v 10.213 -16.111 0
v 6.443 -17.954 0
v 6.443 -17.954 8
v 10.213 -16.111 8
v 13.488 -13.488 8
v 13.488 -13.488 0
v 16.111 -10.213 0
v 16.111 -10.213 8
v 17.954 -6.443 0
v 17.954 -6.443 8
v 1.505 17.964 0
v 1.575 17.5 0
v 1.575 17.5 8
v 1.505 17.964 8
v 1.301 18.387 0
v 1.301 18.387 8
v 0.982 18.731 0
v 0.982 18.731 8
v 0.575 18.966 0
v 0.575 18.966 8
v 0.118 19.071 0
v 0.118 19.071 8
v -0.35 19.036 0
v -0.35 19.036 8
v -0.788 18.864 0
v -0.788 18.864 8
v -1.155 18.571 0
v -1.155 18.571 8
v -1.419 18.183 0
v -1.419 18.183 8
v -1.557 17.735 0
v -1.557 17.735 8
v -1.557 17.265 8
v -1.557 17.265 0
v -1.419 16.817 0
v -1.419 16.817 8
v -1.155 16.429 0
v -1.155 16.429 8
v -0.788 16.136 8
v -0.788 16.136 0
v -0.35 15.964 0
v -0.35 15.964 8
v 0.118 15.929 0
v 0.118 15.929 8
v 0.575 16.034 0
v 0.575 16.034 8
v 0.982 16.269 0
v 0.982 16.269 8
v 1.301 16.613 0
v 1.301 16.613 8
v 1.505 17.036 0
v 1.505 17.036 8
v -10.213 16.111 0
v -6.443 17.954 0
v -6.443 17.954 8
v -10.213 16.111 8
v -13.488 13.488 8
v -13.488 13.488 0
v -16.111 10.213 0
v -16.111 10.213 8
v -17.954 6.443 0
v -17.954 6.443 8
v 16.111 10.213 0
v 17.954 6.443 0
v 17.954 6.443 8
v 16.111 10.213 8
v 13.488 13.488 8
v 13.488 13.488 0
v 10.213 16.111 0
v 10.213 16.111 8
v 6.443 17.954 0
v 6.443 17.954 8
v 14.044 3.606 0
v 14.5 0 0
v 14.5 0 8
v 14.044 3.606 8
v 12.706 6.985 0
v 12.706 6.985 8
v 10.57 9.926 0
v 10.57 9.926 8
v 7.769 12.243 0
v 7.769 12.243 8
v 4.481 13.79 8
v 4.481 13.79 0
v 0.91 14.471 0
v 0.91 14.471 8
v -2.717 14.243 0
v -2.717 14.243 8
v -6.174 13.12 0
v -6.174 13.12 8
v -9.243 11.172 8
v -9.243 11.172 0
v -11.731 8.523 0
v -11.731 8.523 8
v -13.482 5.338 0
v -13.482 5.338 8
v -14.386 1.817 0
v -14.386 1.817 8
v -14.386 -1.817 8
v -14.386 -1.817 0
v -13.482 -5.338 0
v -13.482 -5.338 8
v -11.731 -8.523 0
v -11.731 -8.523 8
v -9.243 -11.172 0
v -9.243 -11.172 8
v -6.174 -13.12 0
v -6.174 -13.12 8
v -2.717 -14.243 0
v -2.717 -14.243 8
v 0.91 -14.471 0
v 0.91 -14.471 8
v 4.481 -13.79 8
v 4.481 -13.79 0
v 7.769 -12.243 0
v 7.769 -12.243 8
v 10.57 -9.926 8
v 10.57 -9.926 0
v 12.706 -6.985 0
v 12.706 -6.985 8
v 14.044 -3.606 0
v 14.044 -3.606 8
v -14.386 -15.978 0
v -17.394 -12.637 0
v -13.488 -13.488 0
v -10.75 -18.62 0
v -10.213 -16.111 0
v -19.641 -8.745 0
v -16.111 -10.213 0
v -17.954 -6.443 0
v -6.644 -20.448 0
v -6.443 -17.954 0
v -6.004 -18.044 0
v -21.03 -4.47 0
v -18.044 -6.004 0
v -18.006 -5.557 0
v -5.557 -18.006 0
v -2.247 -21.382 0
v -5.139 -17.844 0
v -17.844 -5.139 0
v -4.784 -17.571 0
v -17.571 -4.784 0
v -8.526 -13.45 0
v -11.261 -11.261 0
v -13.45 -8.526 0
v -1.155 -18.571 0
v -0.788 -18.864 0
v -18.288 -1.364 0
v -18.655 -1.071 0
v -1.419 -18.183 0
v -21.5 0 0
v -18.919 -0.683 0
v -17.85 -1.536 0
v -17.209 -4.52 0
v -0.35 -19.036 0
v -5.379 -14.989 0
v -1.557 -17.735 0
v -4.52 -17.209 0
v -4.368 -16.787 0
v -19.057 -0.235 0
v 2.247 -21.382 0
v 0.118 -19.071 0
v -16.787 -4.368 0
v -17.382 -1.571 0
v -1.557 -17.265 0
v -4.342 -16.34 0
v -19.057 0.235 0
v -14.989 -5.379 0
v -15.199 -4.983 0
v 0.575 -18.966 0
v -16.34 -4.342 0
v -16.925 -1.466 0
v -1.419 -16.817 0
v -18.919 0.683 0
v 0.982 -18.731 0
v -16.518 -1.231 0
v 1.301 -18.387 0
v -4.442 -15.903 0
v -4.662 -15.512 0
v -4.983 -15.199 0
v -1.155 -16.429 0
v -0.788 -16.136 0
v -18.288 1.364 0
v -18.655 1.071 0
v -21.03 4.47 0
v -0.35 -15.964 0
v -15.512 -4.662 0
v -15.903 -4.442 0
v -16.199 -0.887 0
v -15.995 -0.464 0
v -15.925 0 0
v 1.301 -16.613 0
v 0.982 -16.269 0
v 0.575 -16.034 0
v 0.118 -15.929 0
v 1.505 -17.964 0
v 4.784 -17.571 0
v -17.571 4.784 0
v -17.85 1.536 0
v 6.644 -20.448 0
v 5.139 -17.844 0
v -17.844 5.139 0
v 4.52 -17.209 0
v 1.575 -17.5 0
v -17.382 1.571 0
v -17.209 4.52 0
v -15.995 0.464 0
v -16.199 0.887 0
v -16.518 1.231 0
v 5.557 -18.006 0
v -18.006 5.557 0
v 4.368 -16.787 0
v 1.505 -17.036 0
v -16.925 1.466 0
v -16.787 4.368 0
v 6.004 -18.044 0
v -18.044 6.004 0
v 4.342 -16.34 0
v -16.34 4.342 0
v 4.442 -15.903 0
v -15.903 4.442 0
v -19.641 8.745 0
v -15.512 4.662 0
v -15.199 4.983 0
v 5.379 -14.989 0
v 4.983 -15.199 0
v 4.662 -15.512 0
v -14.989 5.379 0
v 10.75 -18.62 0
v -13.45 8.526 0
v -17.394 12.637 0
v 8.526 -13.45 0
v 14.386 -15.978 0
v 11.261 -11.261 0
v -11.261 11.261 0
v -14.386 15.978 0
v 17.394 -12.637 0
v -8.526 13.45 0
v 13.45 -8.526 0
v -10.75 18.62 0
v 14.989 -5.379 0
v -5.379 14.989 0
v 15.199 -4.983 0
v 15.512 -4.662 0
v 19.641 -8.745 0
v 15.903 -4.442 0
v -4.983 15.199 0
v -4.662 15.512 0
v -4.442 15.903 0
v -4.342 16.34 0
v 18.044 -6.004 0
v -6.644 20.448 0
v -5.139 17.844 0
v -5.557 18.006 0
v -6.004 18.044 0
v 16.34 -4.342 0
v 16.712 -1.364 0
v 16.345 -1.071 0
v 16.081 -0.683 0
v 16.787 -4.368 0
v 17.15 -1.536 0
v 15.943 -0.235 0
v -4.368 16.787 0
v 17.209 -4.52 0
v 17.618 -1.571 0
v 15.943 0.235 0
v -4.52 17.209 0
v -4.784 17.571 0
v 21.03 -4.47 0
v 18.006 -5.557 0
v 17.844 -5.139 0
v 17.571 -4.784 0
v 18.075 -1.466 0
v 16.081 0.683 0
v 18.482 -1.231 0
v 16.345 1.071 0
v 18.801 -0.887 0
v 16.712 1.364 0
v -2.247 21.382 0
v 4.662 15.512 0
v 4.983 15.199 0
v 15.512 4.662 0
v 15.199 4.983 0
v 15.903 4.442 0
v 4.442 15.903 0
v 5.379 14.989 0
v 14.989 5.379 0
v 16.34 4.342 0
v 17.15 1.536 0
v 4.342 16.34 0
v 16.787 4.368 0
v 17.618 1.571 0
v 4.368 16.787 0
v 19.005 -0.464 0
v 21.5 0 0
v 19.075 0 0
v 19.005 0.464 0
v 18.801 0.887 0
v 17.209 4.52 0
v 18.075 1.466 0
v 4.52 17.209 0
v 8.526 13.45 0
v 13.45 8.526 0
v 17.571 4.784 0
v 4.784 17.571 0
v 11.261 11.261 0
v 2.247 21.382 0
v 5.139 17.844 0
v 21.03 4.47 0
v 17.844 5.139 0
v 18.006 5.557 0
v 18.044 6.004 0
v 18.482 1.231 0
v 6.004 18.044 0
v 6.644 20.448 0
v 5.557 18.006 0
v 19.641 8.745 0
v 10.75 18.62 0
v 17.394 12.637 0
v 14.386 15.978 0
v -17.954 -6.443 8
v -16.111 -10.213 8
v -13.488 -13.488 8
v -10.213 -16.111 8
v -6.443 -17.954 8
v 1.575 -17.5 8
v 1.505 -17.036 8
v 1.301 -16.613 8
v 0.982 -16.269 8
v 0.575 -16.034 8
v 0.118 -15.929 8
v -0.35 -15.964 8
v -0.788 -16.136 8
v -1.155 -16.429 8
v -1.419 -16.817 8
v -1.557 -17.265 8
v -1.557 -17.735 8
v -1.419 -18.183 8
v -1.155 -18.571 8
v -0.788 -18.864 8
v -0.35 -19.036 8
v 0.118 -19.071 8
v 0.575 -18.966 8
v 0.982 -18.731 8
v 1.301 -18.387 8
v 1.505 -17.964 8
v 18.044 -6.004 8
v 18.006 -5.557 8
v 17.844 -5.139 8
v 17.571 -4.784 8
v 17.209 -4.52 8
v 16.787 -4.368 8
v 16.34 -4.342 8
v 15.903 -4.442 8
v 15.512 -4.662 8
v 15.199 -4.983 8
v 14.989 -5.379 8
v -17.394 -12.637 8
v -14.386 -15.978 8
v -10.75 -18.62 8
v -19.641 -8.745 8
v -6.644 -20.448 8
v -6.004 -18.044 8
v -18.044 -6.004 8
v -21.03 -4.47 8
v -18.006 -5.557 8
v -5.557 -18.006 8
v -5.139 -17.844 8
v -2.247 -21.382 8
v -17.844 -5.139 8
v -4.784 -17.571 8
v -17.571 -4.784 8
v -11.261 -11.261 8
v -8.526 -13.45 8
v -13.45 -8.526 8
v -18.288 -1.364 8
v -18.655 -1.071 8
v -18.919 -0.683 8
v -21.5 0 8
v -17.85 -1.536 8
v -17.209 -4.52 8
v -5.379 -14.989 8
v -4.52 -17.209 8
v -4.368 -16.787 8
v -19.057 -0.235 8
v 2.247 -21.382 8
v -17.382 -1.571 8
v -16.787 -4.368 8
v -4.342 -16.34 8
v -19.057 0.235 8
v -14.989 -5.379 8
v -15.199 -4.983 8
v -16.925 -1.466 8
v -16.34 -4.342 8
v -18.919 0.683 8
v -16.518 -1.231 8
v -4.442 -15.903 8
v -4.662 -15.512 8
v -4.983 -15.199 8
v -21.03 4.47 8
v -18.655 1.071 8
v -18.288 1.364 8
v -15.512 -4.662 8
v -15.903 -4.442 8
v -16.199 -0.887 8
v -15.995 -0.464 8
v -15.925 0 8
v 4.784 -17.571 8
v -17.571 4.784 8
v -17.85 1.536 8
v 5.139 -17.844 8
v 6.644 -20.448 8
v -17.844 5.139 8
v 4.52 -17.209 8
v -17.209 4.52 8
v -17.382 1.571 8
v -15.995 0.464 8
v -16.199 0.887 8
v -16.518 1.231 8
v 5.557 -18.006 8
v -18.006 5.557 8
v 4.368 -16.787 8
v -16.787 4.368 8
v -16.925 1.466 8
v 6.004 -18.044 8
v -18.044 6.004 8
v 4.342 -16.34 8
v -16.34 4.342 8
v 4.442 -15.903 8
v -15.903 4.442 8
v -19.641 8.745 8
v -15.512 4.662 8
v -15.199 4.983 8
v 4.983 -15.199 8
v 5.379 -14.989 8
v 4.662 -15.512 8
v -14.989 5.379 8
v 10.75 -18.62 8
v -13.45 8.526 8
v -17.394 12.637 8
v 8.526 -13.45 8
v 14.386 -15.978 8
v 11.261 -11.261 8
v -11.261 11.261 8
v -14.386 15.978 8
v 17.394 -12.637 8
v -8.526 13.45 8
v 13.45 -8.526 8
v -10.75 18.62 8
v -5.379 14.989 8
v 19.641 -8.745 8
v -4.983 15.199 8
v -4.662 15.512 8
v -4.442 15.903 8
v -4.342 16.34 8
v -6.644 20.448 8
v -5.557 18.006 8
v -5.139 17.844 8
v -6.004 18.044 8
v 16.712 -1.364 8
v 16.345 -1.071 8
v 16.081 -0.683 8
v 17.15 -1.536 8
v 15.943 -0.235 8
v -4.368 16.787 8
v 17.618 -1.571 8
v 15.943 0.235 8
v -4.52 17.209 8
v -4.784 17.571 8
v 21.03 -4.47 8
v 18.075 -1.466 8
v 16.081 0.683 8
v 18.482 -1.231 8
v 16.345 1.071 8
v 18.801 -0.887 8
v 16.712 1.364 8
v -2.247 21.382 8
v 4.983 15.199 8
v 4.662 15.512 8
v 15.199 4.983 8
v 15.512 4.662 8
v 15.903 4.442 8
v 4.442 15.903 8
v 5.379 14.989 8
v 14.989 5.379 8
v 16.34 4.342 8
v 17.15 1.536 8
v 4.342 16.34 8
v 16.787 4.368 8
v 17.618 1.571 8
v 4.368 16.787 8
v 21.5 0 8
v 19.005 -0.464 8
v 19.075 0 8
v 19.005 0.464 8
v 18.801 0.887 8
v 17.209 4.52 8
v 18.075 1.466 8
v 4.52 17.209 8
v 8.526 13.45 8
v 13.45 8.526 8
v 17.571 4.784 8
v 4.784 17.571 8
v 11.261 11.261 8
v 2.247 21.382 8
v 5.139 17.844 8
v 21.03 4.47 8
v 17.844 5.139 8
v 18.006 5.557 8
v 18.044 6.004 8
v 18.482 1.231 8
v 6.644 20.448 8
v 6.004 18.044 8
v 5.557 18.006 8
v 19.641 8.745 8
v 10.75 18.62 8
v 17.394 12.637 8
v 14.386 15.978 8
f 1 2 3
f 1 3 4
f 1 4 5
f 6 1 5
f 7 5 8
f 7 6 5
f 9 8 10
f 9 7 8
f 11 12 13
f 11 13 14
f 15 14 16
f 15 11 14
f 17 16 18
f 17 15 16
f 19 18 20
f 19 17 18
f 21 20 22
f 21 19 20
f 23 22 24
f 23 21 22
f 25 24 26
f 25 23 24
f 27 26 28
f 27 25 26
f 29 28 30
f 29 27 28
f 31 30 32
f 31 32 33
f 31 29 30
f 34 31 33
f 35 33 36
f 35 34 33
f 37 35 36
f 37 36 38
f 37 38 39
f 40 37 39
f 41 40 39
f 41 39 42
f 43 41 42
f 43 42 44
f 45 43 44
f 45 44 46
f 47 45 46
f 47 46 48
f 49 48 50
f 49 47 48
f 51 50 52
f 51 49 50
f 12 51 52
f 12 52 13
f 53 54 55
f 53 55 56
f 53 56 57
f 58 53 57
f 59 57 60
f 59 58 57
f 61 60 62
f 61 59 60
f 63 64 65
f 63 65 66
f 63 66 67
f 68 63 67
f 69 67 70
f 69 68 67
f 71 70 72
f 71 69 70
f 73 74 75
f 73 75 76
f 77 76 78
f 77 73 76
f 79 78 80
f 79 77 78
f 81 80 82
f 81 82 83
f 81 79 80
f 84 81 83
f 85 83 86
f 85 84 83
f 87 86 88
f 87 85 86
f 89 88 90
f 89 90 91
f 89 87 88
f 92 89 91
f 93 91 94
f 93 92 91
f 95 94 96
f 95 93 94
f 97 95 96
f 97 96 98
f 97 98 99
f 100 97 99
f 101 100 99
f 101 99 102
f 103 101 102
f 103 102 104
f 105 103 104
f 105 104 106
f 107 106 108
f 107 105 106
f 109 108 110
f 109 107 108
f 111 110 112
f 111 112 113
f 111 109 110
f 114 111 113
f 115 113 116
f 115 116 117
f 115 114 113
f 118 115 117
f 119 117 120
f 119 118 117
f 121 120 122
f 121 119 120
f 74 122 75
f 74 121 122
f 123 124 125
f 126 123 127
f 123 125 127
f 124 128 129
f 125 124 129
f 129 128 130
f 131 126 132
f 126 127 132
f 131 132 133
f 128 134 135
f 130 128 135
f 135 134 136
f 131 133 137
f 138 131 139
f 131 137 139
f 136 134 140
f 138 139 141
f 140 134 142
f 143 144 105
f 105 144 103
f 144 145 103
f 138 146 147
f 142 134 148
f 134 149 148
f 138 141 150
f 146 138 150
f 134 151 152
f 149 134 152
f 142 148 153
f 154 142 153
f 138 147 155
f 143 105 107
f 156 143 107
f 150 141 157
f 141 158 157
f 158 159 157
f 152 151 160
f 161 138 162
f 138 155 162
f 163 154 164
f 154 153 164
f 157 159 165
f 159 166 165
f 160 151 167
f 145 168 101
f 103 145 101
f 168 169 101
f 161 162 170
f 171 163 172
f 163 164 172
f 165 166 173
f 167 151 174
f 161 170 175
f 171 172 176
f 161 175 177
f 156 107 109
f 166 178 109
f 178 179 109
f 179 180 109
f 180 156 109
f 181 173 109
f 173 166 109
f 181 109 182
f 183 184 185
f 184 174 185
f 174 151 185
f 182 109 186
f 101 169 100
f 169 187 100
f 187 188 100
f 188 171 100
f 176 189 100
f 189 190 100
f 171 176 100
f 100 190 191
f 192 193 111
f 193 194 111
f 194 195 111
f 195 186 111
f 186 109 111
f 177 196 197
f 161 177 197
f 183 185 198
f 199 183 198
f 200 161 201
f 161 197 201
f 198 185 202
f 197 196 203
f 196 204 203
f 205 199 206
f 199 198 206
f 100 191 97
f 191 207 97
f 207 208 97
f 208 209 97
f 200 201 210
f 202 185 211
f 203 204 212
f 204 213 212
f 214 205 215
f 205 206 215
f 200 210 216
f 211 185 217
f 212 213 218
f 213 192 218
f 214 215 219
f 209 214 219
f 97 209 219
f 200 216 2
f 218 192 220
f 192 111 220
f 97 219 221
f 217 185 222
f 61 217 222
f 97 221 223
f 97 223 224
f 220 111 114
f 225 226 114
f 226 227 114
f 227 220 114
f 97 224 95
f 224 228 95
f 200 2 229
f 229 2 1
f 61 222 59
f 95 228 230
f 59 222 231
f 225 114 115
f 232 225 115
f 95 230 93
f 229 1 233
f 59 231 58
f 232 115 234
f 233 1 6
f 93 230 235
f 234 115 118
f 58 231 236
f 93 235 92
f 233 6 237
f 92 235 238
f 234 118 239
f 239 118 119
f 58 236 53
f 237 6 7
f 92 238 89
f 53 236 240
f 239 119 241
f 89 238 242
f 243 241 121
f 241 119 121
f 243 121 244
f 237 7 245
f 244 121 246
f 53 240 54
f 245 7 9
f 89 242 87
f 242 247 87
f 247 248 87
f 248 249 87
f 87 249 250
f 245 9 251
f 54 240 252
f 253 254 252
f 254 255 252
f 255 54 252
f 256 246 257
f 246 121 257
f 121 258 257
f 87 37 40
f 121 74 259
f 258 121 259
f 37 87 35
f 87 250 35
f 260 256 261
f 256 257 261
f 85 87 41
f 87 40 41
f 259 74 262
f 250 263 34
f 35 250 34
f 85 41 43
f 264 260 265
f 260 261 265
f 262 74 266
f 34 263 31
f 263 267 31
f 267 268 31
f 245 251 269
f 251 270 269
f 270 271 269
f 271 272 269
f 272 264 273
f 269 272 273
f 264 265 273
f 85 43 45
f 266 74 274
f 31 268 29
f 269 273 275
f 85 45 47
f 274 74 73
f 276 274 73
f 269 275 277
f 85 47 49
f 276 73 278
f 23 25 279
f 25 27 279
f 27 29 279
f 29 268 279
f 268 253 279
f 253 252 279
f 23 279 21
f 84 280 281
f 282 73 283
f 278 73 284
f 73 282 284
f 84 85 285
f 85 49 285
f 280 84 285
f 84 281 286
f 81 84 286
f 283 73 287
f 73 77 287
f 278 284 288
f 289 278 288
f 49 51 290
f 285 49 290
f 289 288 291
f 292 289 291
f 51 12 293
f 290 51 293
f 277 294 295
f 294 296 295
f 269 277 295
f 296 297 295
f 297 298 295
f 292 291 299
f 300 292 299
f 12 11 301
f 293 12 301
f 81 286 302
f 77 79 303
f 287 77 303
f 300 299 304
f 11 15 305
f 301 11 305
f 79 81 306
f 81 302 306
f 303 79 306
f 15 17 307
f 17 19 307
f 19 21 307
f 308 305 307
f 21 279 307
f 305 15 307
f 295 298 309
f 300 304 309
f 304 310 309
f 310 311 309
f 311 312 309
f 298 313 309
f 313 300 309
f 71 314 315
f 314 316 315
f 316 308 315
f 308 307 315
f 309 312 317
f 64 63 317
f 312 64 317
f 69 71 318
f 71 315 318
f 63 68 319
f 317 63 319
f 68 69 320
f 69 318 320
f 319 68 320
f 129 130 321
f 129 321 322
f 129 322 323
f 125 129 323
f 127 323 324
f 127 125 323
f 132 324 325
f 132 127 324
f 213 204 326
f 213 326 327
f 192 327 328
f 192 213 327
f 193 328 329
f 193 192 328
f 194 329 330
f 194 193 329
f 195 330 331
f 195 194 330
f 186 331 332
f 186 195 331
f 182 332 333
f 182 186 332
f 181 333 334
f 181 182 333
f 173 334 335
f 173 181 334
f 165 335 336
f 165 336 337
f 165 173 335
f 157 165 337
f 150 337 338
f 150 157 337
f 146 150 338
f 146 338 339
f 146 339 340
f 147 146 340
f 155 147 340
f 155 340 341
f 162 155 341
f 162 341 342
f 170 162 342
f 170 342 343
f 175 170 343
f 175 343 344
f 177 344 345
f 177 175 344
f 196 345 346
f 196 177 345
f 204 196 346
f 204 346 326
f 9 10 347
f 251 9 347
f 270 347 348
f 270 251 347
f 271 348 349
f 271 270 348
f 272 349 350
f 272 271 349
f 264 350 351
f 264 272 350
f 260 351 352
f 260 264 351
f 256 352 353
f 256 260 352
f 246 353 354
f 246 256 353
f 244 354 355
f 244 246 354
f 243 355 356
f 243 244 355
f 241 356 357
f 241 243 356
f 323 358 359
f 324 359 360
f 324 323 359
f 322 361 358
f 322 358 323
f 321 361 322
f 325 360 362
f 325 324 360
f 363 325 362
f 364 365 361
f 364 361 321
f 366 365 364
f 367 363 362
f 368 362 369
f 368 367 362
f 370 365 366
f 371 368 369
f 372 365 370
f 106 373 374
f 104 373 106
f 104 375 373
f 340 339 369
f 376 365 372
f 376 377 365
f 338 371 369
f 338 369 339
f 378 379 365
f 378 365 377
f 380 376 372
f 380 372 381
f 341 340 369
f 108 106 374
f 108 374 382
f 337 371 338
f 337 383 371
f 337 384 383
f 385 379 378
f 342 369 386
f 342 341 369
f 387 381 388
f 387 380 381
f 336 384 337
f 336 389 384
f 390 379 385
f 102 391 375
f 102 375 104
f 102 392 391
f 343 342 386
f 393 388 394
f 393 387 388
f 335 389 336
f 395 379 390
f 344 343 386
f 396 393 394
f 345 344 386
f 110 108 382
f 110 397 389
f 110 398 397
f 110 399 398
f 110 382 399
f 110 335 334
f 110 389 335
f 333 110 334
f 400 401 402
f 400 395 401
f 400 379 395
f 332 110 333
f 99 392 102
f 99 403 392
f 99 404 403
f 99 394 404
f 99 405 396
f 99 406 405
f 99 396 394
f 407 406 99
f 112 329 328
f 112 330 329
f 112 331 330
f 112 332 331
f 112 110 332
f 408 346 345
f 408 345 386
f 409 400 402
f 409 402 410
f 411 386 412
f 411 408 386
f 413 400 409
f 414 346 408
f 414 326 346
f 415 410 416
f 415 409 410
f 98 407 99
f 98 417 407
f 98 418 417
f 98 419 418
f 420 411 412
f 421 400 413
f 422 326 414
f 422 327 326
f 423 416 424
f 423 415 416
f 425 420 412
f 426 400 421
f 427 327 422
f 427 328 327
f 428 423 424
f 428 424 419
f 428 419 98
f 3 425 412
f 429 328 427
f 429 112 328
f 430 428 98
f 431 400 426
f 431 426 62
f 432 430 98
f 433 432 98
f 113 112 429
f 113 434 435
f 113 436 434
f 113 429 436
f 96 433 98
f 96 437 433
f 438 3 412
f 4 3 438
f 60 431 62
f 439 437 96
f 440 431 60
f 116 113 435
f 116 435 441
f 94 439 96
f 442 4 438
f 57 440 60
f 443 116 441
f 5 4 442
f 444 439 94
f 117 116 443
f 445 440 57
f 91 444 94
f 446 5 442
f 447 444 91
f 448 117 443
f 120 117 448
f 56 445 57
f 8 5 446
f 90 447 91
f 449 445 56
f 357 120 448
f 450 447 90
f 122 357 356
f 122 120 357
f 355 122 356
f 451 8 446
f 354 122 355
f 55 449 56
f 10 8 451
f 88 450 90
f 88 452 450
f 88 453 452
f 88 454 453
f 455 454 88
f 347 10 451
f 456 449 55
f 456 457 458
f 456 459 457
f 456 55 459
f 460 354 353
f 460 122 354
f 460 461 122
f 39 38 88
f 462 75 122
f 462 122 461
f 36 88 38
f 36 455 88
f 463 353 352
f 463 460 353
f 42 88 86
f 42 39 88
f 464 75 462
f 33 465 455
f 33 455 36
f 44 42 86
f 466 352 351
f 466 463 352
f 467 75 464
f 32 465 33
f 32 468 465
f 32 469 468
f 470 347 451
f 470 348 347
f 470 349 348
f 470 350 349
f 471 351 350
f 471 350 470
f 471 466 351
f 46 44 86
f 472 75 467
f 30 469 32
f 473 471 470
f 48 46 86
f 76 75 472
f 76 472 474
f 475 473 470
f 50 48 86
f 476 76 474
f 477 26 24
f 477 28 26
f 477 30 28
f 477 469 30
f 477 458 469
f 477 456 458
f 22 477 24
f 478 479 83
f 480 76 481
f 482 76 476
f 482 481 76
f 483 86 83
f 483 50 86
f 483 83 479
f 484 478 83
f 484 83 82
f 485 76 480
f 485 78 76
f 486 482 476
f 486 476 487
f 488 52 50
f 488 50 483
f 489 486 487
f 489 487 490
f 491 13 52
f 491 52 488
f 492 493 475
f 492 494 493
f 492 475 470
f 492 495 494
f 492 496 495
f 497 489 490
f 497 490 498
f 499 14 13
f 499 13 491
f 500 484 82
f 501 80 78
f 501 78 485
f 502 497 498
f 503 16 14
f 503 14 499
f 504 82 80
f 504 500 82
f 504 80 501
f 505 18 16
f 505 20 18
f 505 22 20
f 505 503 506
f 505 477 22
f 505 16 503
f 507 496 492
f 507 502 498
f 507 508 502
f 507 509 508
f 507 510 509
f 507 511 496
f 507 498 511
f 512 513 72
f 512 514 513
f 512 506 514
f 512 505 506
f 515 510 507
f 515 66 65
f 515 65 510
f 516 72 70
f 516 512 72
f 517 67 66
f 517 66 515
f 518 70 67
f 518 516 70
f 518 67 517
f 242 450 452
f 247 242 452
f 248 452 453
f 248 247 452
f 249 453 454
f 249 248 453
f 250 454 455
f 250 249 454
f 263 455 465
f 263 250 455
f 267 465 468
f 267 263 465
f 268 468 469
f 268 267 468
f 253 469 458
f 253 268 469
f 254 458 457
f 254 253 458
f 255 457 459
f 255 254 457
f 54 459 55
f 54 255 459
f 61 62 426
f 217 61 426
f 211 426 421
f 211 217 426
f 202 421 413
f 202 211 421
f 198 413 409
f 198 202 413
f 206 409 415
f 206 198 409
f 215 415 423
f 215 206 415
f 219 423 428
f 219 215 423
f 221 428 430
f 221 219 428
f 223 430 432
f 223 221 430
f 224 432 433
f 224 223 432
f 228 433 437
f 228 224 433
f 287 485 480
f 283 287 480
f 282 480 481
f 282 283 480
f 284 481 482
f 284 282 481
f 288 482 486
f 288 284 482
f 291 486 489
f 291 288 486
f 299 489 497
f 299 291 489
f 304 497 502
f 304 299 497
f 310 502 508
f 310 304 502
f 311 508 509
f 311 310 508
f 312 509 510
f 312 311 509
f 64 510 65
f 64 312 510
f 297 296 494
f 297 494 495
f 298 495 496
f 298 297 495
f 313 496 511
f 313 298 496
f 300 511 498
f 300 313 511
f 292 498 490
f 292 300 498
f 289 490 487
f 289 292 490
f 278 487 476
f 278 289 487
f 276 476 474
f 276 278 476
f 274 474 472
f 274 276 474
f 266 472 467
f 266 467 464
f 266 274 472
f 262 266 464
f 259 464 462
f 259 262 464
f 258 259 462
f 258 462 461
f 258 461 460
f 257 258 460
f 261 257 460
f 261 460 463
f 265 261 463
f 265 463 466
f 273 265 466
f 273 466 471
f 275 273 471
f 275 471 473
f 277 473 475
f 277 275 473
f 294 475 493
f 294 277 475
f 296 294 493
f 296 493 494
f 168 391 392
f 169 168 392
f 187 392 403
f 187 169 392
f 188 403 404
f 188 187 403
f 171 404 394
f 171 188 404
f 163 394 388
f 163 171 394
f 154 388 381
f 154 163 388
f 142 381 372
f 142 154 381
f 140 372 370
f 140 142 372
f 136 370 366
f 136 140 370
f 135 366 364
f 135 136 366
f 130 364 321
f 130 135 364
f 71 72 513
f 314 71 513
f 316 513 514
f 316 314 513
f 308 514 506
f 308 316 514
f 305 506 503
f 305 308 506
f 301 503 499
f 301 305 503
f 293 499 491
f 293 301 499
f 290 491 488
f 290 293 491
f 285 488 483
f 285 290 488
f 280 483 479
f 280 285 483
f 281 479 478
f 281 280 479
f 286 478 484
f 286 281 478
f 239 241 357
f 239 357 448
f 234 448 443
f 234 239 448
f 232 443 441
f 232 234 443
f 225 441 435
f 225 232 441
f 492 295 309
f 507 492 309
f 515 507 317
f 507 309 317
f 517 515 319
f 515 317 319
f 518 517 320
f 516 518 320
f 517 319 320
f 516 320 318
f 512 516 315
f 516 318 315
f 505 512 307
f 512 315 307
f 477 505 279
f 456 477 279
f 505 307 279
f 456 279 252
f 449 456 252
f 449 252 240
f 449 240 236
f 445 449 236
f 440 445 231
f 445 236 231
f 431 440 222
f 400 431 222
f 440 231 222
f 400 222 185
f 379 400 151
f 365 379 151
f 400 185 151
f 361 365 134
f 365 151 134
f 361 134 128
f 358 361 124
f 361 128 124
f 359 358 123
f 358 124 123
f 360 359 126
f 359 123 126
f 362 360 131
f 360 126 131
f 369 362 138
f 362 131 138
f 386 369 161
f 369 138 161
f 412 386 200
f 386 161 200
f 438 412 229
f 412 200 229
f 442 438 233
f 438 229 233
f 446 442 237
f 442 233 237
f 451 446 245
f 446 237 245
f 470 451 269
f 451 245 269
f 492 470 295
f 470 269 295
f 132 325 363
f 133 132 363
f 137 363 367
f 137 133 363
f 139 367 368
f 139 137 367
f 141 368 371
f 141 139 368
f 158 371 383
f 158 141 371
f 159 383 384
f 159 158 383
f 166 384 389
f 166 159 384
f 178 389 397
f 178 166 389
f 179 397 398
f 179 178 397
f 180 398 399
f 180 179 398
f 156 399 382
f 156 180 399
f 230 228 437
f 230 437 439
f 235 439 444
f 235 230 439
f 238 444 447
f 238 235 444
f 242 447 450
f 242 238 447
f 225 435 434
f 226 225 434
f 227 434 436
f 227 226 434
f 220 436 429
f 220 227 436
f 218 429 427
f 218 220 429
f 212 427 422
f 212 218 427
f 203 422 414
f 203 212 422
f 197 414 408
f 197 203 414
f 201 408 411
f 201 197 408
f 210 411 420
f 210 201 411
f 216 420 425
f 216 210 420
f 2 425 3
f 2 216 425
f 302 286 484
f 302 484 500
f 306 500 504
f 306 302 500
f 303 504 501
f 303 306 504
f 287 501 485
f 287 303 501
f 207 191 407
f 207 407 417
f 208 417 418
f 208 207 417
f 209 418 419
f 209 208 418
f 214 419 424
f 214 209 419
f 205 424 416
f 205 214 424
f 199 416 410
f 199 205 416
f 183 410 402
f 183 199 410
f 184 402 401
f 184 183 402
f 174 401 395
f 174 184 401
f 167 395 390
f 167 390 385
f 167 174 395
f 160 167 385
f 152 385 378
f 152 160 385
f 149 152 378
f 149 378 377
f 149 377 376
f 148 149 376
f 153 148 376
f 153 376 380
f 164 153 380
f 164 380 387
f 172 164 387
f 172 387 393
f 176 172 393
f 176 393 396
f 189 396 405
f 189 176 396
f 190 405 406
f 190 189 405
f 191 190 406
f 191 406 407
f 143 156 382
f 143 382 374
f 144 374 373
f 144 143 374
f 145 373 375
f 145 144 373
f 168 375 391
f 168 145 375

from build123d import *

# Parameters (mm, degrees)
SKETCH_1_R      = 21.5
SKETCH_1_R_2    = 14.5
SKETCH_1_R_3    = 1.575
EXTRUDE_1_DEPTH = 8


with BuildPart() as part:
    # 草图1 → 凸台-拉伸1 (new body)
    with BuildSketch(Plane.XY):
        Circle(SKETCH_1_R)
        Circle(SKETCH_1_R_2, mode=Mode.SUBTRACT)
        with Locations((0, 17.5)):
            Circle(SKETCH_1_R_3, mode=Mode.SUBTRACT)
        with Locations((17.5, 0)):
            Circle(SKETCH_1_R_3, mode=Mode.SUBTRACT)
        with Locations((0, -17.5)):
            Circle(SKETCH_1_R_3, mode=Mode.SUBTRACT)
        with Locations((-17.5, 0)):
            Circle(SKETCH_1_R_3, mode=Mode.SUBTRACT)
        with BuildLine():
            ThreePointArc((-5.379173171, 14.989), (-4.428750737, 17.003434709), (-6.443185446, 17.953857143))
            ThreePointArc((-6.443185446, 17.953857143), (-13.488061851, 13.488061851), (-17.953857143, 6.443185446))
            ThreePointArc((-17.953857143, 6.443185446), (-17.003434709, 4.428750737), (-14.989, 5.379173171))
            ThreePointArc((-14.989, 5.379173171), (-11.26067549, 11.26067549), (-5.379173171, 14.989))
        make_face(mode=Mode.SUBTRACT)
        with BuildLine():
            ThreePointArc((5.379173171, 14.989), (11.26067549, 11.26067549), (14.989, 5.379173171))
            ThreePointArc((14.989, 5.379173171), (17.003434709, 4.428750737), (17.953857143, 6.443185446))
            ThreePointArc((17.953857143, 6.443185446), (13.488061851, 13.488061851), (6.443185446, 17.953857143))
            ThreePointArc((6.443185446, 17.953857143), (4.428750737, 17.003434709), (5.379173171, 14.989))
        make_face(mode=Mode.SUBTRACT)
        with BuildLine():
            ThreePointArc((5.379173171, -14.989), (4.428750737, -17.003434709), (6.443185446, -17.953857143))
            ThreePointArc((6.443185446, -17.953857143), (13.488061851, -13.488061851), (17.953857143, -6.443185446))
            ThreePointArc((17.953857143, -6.443185446), (17.003434709, -4.428750737), (14.989, -5.379173171))
            ThreePointArc((14.989, -5.379173171), (11.26067549, -11.26067549), (5.379173171, -14.989))
        make_face(mode=Mode.SUBTRACT)
        with BuildLine():
            ThreePointArc((-5.379173171, -14.989), (-11.26067549, -11.26067549), (-14.989, -5.379173171))
            ThreePointArc((-14.989, -5.379173171), (-17.003434709, -4.428750737), (-17.953857143, -6.443185446))
            ThreePointArc((-17.953857143, -6.443185446), (-13.488061851, -13.488061851), (-6.443185446, -17.953857143))
            ThreePointArc((-6.443185446, -17.953857143), (-4.428750737, -17.003434709), (-5.379173171, -14.989))
        make_face(mode=Mode.SUBTRACT)
    extrude(amount=EXTRUDE_1_DEPTH)


solid = part.part
